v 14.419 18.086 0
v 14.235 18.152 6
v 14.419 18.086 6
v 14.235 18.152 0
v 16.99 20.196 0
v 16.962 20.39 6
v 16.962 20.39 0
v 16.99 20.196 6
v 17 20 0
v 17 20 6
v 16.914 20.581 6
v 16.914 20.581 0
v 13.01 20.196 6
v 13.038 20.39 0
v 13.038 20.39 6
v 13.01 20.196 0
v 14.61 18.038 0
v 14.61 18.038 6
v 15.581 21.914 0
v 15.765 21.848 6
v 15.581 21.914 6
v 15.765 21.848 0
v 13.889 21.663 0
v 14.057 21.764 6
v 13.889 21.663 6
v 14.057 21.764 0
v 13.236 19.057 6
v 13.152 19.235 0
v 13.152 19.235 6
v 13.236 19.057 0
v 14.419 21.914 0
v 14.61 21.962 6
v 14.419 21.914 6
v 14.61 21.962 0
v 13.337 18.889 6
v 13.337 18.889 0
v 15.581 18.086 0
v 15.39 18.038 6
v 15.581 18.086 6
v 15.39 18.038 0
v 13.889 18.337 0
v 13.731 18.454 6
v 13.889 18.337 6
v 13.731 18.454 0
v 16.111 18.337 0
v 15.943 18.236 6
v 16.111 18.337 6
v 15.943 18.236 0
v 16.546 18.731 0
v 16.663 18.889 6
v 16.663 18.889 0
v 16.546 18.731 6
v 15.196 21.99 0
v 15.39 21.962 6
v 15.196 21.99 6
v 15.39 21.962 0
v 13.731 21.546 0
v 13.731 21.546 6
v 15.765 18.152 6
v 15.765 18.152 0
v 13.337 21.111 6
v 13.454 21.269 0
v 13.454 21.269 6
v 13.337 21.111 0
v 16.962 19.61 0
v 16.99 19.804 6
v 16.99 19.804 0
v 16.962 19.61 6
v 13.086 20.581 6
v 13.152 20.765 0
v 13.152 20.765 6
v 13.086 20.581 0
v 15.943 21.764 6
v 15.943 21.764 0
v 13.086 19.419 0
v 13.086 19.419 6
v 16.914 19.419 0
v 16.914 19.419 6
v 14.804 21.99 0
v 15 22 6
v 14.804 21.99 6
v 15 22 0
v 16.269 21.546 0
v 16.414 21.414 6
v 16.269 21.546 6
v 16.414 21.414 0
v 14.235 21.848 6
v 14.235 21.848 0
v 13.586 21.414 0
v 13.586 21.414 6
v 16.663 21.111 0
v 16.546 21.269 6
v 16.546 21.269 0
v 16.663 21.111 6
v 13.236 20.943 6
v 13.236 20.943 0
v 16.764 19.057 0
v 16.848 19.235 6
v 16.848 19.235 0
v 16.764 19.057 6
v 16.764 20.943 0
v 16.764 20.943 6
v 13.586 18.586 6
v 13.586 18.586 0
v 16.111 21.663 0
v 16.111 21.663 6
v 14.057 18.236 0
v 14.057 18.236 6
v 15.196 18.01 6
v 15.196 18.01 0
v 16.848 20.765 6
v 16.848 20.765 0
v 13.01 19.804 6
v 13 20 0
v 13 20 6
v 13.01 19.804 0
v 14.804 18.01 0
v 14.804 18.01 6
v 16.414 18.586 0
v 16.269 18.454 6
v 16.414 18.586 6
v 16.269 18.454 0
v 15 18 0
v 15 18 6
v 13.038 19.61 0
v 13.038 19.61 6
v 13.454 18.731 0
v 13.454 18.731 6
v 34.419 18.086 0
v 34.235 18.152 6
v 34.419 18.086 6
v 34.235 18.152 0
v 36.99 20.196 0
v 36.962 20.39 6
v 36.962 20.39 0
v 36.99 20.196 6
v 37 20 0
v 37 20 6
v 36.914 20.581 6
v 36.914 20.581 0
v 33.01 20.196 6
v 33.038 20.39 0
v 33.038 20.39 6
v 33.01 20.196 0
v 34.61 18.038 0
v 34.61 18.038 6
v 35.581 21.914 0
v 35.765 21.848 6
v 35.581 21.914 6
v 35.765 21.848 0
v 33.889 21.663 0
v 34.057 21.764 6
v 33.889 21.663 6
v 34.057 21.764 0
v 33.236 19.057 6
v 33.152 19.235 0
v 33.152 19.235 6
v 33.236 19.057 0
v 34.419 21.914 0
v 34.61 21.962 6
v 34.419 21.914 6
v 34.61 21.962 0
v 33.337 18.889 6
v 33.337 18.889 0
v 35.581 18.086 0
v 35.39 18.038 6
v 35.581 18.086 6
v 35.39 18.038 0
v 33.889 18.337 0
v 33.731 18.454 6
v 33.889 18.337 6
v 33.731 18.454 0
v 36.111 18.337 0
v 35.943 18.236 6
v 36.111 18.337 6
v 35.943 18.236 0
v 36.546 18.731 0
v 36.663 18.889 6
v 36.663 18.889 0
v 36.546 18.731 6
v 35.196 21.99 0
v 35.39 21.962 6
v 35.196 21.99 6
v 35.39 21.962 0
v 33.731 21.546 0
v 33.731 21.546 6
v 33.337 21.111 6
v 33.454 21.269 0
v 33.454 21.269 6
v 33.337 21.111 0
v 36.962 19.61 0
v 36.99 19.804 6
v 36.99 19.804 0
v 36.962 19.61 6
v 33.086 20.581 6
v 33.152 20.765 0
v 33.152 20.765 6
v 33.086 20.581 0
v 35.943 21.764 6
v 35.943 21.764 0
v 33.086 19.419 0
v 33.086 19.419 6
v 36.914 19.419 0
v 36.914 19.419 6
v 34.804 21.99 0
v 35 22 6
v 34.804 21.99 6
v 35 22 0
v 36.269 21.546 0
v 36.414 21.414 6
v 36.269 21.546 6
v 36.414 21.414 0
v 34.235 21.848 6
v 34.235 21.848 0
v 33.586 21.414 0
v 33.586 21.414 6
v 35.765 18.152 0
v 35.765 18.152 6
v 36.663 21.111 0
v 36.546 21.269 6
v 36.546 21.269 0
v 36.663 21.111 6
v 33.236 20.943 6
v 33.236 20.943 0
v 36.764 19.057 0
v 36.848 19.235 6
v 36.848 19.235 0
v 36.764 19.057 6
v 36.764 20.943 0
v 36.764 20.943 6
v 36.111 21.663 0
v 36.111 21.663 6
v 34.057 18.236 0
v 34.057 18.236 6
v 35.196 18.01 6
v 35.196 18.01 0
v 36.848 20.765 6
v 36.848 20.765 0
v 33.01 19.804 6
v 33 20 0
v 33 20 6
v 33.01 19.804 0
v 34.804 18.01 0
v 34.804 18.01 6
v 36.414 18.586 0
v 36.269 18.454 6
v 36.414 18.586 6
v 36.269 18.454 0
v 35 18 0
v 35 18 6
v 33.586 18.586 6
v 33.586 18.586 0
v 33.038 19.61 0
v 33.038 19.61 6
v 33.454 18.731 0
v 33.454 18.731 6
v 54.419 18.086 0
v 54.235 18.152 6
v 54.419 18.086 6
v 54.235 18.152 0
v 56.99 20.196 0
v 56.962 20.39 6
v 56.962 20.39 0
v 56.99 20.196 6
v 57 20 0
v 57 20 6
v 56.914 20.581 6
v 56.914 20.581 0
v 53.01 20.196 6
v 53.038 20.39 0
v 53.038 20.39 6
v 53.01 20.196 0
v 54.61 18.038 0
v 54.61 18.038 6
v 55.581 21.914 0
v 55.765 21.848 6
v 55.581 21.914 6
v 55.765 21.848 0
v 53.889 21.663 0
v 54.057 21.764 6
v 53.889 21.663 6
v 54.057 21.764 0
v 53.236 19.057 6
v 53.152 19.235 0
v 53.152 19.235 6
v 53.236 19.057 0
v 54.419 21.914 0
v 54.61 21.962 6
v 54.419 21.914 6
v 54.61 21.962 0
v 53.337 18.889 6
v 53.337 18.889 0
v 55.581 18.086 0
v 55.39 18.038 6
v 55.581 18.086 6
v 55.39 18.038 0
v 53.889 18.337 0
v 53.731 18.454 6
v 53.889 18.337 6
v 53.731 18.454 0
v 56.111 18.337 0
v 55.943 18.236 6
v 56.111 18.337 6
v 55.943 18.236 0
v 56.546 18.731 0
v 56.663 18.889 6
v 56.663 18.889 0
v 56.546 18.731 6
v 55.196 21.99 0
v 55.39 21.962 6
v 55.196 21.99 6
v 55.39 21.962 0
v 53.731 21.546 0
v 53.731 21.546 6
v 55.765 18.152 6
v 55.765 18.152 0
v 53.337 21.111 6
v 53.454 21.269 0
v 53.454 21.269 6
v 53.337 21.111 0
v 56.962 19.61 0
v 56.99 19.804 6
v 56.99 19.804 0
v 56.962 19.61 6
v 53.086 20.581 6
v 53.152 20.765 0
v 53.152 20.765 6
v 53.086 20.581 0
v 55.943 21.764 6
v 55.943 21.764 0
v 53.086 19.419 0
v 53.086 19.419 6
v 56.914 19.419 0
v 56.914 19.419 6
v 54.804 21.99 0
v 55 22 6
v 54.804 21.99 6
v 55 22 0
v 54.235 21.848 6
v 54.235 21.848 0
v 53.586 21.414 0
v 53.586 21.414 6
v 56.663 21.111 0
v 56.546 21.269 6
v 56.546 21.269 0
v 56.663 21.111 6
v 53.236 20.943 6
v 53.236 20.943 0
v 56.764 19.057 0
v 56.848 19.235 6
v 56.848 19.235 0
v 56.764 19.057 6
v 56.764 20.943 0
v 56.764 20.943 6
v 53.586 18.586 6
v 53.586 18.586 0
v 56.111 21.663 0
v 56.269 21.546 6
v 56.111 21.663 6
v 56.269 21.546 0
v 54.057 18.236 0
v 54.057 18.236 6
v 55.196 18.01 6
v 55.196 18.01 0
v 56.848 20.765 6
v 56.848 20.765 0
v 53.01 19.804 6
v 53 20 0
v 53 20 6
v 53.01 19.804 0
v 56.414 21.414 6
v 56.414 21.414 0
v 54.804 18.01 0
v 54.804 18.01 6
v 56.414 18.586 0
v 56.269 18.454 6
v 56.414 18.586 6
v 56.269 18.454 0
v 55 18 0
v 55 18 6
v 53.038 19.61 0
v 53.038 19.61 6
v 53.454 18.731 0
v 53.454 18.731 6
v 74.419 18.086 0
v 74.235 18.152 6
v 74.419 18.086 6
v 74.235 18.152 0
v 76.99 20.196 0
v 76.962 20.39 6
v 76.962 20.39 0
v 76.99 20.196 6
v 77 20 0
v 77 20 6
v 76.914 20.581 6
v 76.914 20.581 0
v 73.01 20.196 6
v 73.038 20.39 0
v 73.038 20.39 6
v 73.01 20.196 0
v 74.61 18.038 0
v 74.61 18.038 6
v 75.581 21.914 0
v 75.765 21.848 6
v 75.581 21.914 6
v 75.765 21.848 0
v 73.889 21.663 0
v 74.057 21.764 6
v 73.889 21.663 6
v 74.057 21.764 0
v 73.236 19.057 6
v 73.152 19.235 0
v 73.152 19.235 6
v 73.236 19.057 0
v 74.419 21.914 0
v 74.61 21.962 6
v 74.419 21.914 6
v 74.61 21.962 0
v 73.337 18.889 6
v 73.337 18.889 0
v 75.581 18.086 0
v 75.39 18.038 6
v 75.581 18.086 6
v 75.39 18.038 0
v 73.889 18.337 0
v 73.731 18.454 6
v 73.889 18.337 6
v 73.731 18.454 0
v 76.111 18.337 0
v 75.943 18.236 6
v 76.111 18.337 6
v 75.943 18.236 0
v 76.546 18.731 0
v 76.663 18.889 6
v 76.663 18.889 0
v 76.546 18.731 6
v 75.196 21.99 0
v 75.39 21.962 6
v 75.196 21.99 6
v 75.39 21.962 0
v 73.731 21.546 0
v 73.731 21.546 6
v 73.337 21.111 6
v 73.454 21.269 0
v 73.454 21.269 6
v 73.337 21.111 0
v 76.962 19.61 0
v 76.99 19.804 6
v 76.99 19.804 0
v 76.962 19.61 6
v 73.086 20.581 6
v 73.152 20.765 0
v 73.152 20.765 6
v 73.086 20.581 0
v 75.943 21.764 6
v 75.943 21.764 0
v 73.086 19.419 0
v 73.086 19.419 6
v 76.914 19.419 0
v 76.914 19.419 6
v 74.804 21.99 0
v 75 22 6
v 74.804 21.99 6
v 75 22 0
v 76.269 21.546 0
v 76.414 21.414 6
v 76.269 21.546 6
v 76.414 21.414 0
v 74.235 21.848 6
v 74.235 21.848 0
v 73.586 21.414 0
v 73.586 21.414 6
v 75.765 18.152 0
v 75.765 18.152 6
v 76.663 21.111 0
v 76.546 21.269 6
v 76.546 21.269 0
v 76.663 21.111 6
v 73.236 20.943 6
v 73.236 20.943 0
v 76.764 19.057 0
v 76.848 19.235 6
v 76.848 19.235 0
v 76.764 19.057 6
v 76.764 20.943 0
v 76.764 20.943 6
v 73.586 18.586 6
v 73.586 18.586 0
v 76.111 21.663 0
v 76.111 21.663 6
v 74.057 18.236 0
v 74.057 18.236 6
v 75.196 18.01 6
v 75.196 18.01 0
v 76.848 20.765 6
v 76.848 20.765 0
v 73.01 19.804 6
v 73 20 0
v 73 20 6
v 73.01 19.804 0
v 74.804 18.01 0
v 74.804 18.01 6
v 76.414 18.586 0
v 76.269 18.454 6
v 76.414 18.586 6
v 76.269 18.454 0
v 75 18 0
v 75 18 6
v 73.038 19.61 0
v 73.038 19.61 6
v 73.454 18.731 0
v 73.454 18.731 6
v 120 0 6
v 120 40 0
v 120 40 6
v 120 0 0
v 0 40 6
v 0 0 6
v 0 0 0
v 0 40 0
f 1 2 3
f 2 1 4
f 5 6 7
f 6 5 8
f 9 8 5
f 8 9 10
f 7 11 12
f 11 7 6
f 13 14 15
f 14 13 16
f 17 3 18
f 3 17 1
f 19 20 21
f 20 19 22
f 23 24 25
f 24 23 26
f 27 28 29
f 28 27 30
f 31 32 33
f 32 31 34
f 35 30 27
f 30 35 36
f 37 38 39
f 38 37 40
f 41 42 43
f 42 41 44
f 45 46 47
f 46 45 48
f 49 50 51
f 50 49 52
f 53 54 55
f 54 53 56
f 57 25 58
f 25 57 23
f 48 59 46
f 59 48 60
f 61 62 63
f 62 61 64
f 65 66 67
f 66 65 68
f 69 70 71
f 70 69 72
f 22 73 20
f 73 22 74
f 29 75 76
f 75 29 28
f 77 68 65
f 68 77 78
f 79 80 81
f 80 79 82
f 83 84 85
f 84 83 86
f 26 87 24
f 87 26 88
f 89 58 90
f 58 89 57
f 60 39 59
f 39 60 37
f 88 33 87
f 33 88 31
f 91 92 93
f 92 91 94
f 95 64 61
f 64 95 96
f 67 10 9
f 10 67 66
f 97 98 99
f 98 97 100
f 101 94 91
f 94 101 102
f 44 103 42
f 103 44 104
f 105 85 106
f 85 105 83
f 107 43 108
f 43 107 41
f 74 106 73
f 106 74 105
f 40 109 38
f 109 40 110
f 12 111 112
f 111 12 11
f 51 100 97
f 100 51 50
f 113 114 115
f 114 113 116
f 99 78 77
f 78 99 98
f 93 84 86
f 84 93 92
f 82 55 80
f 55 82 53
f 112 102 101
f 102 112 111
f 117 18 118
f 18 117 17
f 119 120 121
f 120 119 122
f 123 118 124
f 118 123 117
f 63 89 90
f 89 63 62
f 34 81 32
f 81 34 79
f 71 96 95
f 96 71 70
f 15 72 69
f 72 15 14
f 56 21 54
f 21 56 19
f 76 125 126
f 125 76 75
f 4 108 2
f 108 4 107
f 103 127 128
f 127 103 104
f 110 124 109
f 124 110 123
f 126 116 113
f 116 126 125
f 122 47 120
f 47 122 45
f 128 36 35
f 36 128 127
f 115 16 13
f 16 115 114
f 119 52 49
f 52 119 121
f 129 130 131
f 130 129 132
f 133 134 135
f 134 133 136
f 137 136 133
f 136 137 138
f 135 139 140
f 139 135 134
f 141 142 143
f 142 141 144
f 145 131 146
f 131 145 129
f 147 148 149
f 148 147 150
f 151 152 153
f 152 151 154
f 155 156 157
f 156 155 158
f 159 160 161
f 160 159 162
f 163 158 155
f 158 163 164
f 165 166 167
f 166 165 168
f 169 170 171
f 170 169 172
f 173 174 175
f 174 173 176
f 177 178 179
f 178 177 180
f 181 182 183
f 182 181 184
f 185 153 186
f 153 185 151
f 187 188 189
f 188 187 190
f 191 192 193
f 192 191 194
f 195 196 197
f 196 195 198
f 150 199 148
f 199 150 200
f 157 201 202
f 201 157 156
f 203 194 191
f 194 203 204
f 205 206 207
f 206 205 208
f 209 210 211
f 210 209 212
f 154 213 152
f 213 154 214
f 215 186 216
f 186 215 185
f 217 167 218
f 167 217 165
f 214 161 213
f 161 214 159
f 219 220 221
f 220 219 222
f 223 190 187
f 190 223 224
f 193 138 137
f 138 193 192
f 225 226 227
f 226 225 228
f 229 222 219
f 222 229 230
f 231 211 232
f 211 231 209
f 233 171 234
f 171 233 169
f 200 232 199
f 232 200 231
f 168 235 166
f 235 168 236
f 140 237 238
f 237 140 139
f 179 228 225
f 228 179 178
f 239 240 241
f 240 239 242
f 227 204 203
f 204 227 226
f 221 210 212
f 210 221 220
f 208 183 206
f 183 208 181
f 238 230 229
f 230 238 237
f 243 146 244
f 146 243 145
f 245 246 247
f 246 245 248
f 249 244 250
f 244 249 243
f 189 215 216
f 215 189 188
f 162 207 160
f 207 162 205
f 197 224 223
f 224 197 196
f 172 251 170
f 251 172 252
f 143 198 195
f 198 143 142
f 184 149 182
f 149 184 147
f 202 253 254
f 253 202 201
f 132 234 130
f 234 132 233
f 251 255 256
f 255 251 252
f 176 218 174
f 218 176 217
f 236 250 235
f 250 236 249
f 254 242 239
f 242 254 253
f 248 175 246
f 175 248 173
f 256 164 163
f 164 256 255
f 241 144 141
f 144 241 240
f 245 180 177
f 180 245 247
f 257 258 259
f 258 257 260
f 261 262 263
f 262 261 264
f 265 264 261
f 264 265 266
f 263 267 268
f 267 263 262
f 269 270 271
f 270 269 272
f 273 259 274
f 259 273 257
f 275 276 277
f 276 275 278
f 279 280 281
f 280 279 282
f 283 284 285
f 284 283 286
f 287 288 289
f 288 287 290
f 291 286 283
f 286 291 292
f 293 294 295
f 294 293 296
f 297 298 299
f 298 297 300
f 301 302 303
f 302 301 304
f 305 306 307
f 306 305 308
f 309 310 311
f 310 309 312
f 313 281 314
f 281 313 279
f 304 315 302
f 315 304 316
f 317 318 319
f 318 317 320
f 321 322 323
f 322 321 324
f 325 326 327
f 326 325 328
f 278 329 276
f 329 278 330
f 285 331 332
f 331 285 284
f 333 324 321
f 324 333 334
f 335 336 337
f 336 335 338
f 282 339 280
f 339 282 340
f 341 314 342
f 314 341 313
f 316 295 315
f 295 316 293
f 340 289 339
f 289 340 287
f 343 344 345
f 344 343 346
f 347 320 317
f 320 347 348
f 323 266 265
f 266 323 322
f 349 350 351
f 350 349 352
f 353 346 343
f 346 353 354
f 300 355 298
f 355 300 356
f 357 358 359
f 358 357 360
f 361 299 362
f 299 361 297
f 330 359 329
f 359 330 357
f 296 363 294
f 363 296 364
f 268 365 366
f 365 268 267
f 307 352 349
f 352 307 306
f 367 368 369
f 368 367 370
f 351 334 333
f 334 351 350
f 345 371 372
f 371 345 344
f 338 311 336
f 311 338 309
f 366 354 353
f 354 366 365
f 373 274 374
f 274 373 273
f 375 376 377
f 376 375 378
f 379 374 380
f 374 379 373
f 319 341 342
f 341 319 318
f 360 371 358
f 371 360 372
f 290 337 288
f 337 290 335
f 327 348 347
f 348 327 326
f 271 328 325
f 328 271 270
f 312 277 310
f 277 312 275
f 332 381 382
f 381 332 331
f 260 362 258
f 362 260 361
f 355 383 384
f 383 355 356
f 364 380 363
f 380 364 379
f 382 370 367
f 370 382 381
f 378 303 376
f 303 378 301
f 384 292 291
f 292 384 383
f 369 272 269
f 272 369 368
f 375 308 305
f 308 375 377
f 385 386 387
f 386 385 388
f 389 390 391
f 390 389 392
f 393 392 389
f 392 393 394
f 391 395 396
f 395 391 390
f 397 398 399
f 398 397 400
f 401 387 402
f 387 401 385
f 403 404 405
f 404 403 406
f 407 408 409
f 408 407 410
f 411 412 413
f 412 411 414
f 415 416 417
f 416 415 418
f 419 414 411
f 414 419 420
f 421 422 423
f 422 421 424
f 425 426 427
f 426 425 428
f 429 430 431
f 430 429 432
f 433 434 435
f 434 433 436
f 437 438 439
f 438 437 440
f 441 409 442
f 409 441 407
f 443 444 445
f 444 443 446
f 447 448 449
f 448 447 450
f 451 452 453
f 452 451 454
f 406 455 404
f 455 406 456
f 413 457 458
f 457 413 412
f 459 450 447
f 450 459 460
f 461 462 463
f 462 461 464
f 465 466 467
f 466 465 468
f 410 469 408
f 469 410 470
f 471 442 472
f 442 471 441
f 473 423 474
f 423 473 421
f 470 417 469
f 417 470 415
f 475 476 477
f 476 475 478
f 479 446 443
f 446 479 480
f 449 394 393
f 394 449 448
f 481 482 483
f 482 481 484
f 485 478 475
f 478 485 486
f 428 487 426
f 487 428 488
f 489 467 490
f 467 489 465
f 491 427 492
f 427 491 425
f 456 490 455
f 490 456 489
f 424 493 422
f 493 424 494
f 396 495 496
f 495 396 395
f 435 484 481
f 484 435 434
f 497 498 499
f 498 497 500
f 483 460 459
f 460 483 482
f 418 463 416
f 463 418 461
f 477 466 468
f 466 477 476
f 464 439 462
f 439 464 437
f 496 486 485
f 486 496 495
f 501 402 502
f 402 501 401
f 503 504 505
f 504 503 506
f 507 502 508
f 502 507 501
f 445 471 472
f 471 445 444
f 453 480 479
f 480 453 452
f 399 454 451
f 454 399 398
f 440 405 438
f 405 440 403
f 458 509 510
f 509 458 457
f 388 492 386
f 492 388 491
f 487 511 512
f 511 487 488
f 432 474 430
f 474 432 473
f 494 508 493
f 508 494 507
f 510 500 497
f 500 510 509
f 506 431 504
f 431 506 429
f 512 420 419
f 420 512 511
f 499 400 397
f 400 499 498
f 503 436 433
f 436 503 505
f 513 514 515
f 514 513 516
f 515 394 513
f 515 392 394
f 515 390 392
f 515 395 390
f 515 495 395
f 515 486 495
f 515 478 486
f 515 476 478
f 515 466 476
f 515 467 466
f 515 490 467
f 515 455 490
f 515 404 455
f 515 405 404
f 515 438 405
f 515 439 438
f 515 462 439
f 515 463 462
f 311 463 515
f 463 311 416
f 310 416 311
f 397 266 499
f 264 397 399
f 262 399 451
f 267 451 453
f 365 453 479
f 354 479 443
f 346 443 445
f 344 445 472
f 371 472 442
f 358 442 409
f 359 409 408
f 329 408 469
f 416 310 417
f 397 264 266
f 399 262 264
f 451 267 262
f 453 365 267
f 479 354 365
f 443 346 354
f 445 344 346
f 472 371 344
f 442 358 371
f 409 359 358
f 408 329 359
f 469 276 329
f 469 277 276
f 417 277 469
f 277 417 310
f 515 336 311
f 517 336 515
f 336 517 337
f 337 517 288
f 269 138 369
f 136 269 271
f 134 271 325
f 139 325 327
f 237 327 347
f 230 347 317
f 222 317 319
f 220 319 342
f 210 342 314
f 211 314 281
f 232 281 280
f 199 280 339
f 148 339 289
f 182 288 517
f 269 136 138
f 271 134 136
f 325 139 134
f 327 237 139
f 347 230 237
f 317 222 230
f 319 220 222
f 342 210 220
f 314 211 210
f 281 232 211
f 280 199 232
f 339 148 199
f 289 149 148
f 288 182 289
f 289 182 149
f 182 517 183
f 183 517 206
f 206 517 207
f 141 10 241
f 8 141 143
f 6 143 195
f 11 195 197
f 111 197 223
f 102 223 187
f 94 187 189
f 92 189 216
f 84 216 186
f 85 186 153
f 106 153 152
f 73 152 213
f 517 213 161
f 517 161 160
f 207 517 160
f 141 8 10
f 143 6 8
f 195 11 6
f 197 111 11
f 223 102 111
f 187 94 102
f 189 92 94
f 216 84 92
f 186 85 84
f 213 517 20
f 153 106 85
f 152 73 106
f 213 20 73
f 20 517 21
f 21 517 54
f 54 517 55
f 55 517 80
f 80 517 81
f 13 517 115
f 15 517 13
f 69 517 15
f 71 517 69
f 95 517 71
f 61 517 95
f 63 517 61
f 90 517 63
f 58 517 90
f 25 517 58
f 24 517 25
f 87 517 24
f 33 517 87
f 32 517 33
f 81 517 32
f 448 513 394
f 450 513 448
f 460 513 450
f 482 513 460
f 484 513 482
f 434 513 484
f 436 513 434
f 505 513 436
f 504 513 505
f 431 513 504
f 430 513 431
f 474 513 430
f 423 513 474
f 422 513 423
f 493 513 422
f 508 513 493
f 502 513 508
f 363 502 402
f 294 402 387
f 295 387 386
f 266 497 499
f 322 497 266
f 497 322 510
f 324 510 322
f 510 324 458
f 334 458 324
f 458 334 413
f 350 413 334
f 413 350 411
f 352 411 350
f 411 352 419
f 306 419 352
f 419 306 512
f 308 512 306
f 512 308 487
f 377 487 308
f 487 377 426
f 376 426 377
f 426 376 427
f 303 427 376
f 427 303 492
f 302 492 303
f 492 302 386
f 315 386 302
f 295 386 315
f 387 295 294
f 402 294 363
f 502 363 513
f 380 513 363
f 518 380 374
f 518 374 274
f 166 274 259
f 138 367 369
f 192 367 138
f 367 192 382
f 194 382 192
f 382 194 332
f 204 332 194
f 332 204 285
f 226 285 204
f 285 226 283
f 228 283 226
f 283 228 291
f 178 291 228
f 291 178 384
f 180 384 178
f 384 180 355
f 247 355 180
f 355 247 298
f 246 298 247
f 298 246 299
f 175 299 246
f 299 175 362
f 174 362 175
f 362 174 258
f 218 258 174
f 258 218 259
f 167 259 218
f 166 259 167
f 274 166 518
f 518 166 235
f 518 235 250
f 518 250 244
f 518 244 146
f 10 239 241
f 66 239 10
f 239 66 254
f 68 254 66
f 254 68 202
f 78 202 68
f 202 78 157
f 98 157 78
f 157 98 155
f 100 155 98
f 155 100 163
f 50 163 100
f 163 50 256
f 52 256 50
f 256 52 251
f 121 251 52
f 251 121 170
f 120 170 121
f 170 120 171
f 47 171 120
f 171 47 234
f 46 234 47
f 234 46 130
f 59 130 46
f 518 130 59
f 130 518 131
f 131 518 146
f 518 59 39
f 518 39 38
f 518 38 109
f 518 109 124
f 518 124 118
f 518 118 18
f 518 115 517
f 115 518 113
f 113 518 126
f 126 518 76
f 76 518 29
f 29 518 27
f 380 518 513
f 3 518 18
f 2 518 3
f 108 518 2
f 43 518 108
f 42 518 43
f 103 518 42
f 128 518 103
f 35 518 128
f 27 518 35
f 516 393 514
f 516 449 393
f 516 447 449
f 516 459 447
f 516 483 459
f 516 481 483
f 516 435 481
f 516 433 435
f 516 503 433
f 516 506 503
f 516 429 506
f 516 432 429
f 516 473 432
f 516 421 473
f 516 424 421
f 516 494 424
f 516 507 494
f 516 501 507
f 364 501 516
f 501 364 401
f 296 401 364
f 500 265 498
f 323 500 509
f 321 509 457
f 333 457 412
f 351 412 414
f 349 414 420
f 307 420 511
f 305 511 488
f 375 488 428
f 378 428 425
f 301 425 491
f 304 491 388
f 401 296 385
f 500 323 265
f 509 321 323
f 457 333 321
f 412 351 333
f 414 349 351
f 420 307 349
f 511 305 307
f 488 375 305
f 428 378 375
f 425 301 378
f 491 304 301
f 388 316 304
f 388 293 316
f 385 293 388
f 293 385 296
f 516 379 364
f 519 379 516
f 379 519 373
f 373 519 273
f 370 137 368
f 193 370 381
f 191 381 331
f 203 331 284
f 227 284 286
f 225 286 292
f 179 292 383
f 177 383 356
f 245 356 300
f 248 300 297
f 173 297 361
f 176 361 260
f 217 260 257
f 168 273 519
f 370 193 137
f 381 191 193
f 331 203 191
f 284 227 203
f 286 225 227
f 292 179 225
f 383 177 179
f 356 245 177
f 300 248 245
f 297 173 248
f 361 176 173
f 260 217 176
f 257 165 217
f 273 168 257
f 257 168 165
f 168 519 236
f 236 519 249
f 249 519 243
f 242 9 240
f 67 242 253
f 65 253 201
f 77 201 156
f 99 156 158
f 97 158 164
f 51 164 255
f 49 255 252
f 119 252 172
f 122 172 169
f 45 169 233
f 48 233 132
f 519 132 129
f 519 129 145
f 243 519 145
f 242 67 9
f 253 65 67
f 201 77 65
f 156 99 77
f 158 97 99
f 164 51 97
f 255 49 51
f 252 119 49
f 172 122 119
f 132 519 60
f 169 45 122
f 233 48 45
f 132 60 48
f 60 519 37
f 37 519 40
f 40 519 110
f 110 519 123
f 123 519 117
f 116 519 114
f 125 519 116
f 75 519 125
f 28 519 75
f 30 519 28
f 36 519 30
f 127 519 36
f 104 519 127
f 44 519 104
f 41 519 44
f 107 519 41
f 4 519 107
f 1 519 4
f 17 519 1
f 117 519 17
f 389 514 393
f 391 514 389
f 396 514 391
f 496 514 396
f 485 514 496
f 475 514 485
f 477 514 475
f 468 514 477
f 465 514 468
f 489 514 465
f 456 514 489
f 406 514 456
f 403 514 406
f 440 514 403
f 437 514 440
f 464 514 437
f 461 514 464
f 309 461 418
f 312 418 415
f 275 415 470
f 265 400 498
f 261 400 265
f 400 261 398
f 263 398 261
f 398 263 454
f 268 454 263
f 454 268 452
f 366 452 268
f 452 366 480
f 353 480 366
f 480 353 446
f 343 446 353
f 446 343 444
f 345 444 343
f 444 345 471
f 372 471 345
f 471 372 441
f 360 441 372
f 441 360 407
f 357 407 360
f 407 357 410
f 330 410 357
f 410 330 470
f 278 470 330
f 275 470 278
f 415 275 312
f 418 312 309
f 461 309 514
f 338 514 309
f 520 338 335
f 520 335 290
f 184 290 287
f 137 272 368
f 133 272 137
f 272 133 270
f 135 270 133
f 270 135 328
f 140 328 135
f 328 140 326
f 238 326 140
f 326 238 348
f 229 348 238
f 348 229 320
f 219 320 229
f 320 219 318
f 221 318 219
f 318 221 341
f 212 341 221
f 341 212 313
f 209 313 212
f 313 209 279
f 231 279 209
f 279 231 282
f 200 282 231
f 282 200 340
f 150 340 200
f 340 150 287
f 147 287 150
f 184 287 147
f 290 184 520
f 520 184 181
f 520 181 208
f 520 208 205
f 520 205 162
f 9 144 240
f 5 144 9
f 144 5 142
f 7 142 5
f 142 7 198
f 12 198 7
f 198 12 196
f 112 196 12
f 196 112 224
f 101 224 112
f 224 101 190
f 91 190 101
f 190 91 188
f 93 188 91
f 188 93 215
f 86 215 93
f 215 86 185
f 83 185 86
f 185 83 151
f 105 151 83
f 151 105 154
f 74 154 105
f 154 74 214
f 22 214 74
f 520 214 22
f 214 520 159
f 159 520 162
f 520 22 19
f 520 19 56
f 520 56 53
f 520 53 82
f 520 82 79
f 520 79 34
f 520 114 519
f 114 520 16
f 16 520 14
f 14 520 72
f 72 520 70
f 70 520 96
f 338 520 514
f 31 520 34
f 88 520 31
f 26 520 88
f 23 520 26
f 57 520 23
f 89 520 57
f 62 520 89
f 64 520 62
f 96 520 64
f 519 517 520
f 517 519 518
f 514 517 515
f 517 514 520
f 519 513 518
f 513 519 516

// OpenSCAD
// Scadretto acceptance fixture — keep this comment.
$fn = 64;
hole_d = 4;
count = 4;
pitch = 20;
x0 = 15;
plate_h = 6;

module mounting_hole(d) {
    cylinder(h = plate_h + 2, d = d);
}

difference() {
    cube([120, 40, plate_h]);
    for (i = [0 : count - 1])
        translate([x0 + i * pitch, 20, -1])
            mounting_hole(d = hole_d);
}
